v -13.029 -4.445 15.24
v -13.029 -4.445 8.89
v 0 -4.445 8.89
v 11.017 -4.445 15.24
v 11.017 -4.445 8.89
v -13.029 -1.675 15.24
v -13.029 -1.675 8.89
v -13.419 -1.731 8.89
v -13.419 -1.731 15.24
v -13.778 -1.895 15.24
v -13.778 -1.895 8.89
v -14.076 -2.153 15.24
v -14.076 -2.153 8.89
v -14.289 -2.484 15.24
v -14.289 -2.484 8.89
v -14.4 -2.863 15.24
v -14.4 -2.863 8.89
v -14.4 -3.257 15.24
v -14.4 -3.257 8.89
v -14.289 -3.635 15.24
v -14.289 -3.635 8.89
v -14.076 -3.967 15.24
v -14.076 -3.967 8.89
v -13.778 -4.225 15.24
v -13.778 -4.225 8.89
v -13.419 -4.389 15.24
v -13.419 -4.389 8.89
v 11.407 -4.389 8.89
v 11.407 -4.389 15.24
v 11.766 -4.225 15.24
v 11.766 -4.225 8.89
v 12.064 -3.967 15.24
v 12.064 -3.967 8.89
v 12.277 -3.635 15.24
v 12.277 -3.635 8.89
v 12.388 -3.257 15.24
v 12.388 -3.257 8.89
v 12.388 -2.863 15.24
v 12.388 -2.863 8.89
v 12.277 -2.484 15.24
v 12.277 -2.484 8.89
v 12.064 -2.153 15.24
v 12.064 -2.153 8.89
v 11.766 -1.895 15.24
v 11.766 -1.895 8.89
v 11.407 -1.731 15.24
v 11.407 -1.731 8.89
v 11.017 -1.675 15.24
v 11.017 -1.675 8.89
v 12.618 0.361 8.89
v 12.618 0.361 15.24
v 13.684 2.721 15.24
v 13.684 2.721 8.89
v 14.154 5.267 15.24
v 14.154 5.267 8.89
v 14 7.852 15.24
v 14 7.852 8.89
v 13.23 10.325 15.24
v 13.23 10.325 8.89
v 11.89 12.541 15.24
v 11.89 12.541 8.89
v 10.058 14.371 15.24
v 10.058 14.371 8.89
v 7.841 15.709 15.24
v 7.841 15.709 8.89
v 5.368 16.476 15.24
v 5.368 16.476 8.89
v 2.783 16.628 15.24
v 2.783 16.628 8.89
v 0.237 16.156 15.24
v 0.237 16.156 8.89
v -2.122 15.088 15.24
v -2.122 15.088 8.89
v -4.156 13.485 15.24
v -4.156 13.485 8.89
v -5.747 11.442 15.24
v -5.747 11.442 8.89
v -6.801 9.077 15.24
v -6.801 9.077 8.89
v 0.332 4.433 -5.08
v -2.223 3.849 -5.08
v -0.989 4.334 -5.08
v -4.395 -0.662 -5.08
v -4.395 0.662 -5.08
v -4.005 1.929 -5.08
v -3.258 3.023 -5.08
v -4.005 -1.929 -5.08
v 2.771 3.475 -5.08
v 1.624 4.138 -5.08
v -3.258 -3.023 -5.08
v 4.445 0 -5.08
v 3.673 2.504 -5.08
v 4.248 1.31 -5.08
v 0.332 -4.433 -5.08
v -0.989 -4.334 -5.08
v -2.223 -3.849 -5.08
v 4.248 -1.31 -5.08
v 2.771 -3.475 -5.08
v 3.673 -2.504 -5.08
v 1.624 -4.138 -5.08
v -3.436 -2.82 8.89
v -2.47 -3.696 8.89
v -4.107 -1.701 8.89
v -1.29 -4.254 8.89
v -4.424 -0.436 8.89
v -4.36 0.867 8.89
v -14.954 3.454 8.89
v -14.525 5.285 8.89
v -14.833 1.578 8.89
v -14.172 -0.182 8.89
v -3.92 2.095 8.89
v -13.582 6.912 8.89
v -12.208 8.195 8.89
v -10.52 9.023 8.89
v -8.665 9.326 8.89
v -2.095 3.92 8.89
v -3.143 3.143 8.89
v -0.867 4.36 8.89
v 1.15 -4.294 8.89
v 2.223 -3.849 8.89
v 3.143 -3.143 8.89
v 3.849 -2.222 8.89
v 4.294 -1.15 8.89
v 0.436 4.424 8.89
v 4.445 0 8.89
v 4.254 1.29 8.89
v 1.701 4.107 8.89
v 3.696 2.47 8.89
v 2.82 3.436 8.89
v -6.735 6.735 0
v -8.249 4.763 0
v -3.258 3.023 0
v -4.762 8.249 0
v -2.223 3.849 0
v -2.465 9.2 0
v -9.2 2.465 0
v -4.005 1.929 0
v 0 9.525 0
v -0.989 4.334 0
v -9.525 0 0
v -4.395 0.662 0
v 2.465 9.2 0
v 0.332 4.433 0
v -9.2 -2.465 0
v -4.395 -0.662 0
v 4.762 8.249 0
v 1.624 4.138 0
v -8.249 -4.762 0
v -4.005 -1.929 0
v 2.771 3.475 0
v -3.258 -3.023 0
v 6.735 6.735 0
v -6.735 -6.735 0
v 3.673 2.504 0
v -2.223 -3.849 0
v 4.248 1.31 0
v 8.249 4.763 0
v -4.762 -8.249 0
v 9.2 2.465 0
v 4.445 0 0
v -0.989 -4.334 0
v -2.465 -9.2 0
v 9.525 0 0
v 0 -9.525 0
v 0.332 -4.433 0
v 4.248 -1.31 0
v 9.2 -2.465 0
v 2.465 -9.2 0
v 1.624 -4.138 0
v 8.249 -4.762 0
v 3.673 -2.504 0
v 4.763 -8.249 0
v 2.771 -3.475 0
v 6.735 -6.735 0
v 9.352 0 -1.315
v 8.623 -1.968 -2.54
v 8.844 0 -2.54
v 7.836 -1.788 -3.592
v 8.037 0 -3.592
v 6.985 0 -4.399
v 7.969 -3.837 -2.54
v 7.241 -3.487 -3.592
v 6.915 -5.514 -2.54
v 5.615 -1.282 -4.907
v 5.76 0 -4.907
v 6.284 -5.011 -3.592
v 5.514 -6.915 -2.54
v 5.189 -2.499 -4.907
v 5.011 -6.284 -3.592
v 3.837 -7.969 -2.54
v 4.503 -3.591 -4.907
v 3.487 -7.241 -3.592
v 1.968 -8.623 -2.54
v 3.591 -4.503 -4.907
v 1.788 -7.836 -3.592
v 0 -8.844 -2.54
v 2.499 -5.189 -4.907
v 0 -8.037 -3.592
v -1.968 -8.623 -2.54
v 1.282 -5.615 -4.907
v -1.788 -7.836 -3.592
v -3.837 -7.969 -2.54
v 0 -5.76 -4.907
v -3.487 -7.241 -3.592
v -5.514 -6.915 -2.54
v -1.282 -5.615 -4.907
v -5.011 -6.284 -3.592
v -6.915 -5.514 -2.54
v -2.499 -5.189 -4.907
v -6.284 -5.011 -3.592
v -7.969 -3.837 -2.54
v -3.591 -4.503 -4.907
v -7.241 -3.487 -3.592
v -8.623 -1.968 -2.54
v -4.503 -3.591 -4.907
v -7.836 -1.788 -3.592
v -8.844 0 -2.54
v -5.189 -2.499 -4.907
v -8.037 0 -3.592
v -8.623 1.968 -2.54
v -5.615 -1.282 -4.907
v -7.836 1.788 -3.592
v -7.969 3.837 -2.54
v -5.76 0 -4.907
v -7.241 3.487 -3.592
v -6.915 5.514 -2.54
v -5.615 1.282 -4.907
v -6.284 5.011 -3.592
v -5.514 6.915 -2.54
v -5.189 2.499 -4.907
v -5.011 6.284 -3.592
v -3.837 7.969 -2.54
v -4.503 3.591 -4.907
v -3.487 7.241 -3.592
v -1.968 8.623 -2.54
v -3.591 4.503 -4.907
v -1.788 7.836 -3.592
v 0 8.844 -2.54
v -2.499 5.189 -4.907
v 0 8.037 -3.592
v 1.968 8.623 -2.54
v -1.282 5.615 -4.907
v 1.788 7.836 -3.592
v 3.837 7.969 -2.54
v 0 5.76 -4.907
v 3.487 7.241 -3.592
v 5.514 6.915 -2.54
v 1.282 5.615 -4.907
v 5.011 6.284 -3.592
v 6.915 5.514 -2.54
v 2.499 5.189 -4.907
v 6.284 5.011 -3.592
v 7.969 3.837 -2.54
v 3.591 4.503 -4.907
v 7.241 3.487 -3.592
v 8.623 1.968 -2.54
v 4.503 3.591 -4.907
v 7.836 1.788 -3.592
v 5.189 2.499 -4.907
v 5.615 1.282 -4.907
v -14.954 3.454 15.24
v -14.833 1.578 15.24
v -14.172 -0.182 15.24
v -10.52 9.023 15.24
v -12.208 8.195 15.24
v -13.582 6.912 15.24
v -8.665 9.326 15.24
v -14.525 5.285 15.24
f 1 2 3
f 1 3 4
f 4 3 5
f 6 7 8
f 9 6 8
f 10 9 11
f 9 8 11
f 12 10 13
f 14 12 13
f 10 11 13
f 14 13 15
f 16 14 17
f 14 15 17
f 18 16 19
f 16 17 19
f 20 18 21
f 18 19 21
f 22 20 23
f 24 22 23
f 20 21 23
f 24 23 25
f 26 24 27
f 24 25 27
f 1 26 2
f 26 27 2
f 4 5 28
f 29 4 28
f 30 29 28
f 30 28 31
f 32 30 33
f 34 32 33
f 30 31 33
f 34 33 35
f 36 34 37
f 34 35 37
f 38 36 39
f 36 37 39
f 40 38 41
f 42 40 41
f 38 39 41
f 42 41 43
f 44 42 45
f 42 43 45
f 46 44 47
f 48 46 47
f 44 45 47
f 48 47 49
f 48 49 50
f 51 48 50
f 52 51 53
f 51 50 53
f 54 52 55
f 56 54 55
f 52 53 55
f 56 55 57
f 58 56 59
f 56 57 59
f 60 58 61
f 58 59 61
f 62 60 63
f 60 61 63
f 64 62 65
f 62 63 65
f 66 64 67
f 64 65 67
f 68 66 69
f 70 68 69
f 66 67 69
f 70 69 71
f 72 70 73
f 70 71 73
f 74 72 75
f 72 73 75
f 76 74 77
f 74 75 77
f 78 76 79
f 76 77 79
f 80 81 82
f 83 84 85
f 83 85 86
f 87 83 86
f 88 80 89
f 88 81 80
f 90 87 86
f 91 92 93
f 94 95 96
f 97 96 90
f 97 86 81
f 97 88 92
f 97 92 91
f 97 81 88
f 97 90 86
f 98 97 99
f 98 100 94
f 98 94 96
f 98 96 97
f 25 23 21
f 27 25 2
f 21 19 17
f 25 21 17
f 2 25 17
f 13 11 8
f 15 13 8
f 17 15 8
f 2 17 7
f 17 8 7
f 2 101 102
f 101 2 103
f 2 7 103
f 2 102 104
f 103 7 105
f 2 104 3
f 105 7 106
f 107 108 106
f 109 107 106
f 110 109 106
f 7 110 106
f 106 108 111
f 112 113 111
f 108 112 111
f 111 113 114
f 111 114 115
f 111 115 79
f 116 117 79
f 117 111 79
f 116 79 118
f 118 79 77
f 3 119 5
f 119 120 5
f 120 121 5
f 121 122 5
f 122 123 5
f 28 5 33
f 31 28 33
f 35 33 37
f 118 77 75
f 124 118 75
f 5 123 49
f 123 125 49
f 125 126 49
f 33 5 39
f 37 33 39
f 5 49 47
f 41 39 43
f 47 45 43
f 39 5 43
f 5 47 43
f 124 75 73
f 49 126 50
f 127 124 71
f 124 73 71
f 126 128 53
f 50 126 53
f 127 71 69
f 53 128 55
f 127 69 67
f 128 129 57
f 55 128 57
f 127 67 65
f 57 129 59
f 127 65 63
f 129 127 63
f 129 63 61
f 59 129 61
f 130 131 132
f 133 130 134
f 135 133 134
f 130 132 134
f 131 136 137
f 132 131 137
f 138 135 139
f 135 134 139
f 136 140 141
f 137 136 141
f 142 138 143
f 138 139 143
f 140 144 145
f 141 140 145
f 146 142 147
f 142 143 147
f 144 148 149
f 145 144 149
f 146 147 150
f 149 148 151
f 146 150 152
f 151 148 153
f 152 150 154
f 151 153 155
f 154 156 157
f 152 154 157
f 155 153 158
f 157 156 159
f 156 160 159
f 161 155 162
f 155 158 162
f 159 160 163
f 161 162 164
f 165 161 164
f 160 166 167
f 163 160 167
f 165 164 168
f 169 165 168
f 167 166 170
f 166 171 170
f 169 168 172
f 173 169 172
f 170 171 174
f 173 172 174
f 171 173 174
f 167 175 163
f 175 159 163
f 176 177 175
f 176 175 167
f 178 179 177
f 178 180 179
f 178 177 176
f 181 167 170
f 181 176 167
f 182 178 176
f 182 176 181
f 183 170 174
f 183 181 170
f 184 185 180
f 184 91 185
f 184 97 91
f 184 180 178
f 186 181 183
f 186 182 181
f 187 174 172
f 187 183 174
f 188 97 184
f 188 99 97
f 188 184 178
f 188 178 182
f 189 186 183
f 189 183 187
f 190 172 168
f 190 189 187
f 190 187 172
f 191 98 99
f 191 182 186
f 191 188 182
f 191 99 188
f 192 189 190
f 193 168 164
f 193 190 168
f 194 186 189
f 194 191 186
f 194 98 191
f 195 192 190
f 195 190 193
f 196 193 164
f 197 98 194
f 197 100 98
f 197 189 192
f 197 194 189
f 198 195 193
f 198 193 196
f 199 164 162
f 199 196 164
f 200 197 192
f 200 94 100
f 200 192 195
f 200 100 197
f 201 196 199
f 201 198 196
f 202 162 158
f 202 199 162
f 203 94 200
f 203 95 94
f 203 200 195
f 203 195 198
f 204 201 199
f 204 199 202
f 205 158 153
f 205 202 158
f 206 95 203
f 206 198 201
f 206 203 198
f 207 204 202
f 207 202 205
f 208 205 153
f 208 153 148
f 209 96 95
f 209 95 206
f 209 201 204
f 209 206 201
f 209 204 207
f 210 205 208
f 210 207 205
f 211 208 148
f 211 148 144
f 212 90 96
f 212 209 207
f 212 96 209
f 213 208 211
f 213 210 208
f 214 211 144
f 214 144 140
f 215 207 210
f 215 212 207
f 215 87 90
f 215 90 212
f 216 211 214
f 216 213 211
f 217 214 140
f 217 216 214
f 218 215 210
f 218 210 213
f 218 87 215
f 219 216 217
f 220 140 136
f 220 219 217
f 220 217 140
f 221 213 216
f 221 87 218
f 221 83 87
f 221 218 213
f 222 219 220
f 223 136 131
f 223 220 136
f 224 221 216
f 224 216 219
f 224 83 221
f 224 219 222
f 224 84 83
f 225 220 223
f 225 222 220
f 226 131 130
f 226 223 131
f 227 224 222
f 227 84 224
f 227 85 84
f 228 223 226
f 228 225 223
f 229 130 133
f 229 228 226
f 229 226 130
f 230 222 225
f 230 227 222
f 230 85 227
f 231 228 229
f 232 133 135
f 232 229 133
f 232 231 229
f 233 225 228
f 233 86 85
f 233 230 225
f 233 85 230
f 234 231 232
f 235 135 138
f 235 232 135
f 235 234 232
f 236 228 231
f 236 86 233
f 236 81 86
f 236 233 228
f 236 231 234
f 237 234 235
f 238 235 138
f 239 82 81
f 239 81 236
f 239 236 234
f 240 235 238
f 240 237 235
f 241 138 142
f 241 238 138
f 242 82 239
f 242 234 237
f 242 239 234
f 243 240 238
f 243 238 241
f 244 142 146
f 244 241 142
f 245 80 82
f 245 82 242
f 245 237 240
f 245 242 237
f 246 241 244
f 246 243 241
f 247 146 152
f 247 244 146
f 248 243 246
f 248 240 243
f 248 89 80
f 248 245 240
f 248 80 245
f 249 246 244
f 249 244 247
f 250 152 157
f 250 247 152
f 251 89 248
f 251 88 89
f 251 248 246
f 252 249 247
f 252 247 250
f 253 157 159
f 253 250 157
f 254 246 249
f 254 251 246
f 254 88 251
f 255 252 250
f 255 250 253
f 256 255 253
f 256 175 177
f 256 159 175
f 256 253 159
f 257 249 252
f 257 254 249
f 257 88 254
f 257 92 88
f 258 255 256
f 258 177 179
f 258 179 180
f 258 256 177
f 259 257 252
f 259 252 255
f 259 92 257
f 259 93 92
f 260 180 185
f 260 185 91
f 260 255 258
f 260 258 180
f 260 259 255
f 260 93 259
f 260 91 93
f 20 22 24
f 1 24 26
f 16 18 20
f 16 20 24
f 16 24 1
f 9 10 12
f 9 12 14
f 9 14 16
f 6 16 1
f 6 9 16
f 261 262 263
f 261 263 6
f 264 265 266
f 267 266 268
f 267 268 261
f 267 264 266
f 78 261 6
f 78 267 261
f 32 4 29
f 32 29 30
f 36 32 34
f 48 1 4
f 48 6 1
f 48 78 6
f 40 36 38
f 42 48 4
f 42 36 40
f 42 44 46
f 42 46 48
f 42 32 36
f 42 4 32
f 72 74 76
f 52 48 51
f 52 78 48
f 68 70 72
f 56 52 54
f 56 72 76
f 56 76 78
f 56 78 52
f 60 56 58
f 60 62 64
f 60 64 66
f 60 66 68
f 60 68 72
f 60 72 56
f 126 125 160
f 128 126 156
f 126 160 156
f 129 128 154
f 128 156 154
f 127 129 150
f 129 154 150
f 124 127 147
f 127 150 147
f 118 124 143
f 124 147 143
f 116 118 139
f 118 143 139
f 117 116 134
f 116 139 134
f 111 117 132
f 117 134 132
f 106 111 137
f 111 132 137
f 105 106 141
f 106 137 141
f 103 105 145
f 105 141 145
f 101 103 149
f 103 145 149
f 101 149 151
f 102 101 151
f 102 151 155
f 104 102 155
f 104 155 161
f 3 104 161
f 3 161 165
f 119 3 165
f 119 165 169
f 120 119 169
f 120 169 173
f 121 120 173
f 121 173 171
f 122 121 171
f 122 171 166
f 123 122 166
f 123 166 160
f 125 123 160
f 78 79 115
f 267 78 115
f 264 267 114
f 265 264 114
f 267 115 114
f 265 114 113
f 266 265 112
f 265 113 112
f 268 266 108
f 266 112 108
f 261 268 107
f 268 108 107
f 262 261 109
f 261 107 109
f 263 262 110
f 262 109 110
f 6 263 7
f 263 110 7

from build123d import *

# Parameters (mm, degrees)
F0_R     = 4.445
F1_DEPTH = 8.89
F3_DEPTH = 6.35
F4_R     = 9.525
F5_DEPTH = 5.08
F6_R     = 5.07999


# Not quite as in the source:
# - a fillet or chamfer is up to 0.001 mm smaller than in the source, because OpenCascade refuses the exact size


with BuildPart() as f1:
    # F0 (on Top) → F1 (new body)
    with BuildSketch(Plane.XY):
        Circle(F0_R)
    extrude(amount=F1_DEPTH)

    # F2 (on face) → F3 (join)
    with BuildSketch(Plane.XY.offset(8.89)):
        with BuildLine():
            Line((-13.0288261443, -4.445), (11.0172175353, -4.445))
            ThreePointArc((11.0172175353, -4.445), (12.4023835963, -3.0598339389), (11.0172175353, -1.6746678779))
            Line((11.0172175353, -1.6746678779), (-4.1174643288, -1.6746678779))
            Line((-4.1174643288, -1.6746678779), (-13.0288261443, -1.6746678779))
            ThreePointArc((-13.0288261443, -1.6746678779), (-14.4139922054, -3.0598339389), (-13.0288261443, -4.445))
        make_face()
        with BuildLine():
            Line((-4.1174643288, -1.6746678779), (11.0172175353, -1.6746678779))
            ThreePointArc((11.0172175353, -1.6746678779), (8.99040904, 15.1069926007), (-6.8009194972, 9.0765677298))
            ThreePointArc((-6.8009194972, 9.0765677298), (-2.3607405432, 4.4743080446), (-4.1174643288, -1.6746678779))
        make_face()
        with BuildLine():
            ThreePointArc((-6.8009194972, 9.0765677298), (-14.1136776733, 6.1332066084), (-13.0288261443, -1.6746678779))
            Line((-13.0288261443, -1.6746678779), (-4.1174643288, -1.6746678779))
            ThreePointArc((-4.1174643288, -1.6746678779), (-6.9553513424, 3.3275159413), (-6.8009194972, 9.0765677298))
        make_face()
        with BuildLine():
            ThreePointArc((-6.8009194972, 9.0765677298), (-6.9553513424, 3.3275159413), (-4.1174643288, -1.6746678779))
            ThreePointArc((-4.1174643288, -1.6746678779), (-2.3607405432, 4.4743080446), (-6.8009194972, 9.0765677298))
        make_face()
    extrude(amount=F3_DEPTH)

    # F4 (on face) → F5 (join)
    with BuildSketch(Plane(origin=(0, 0, 0), x_dir=(1, 0, 0), z_dir=(0, 0, -1))):
        Circle(F4_R)
    extrude(amount=F5_DEPTH)

    # F6 (radius 5.08 in the source; OpenCascade refuses exactly that, so slightly less here)
    f6_edges = [f1.edges().sort_by_distance(p)[0] for p in [
        (-9.525, 0, -5.08),
    ]]
    fillet(f6_edges, radius=F6_R)


solid = f1.part
